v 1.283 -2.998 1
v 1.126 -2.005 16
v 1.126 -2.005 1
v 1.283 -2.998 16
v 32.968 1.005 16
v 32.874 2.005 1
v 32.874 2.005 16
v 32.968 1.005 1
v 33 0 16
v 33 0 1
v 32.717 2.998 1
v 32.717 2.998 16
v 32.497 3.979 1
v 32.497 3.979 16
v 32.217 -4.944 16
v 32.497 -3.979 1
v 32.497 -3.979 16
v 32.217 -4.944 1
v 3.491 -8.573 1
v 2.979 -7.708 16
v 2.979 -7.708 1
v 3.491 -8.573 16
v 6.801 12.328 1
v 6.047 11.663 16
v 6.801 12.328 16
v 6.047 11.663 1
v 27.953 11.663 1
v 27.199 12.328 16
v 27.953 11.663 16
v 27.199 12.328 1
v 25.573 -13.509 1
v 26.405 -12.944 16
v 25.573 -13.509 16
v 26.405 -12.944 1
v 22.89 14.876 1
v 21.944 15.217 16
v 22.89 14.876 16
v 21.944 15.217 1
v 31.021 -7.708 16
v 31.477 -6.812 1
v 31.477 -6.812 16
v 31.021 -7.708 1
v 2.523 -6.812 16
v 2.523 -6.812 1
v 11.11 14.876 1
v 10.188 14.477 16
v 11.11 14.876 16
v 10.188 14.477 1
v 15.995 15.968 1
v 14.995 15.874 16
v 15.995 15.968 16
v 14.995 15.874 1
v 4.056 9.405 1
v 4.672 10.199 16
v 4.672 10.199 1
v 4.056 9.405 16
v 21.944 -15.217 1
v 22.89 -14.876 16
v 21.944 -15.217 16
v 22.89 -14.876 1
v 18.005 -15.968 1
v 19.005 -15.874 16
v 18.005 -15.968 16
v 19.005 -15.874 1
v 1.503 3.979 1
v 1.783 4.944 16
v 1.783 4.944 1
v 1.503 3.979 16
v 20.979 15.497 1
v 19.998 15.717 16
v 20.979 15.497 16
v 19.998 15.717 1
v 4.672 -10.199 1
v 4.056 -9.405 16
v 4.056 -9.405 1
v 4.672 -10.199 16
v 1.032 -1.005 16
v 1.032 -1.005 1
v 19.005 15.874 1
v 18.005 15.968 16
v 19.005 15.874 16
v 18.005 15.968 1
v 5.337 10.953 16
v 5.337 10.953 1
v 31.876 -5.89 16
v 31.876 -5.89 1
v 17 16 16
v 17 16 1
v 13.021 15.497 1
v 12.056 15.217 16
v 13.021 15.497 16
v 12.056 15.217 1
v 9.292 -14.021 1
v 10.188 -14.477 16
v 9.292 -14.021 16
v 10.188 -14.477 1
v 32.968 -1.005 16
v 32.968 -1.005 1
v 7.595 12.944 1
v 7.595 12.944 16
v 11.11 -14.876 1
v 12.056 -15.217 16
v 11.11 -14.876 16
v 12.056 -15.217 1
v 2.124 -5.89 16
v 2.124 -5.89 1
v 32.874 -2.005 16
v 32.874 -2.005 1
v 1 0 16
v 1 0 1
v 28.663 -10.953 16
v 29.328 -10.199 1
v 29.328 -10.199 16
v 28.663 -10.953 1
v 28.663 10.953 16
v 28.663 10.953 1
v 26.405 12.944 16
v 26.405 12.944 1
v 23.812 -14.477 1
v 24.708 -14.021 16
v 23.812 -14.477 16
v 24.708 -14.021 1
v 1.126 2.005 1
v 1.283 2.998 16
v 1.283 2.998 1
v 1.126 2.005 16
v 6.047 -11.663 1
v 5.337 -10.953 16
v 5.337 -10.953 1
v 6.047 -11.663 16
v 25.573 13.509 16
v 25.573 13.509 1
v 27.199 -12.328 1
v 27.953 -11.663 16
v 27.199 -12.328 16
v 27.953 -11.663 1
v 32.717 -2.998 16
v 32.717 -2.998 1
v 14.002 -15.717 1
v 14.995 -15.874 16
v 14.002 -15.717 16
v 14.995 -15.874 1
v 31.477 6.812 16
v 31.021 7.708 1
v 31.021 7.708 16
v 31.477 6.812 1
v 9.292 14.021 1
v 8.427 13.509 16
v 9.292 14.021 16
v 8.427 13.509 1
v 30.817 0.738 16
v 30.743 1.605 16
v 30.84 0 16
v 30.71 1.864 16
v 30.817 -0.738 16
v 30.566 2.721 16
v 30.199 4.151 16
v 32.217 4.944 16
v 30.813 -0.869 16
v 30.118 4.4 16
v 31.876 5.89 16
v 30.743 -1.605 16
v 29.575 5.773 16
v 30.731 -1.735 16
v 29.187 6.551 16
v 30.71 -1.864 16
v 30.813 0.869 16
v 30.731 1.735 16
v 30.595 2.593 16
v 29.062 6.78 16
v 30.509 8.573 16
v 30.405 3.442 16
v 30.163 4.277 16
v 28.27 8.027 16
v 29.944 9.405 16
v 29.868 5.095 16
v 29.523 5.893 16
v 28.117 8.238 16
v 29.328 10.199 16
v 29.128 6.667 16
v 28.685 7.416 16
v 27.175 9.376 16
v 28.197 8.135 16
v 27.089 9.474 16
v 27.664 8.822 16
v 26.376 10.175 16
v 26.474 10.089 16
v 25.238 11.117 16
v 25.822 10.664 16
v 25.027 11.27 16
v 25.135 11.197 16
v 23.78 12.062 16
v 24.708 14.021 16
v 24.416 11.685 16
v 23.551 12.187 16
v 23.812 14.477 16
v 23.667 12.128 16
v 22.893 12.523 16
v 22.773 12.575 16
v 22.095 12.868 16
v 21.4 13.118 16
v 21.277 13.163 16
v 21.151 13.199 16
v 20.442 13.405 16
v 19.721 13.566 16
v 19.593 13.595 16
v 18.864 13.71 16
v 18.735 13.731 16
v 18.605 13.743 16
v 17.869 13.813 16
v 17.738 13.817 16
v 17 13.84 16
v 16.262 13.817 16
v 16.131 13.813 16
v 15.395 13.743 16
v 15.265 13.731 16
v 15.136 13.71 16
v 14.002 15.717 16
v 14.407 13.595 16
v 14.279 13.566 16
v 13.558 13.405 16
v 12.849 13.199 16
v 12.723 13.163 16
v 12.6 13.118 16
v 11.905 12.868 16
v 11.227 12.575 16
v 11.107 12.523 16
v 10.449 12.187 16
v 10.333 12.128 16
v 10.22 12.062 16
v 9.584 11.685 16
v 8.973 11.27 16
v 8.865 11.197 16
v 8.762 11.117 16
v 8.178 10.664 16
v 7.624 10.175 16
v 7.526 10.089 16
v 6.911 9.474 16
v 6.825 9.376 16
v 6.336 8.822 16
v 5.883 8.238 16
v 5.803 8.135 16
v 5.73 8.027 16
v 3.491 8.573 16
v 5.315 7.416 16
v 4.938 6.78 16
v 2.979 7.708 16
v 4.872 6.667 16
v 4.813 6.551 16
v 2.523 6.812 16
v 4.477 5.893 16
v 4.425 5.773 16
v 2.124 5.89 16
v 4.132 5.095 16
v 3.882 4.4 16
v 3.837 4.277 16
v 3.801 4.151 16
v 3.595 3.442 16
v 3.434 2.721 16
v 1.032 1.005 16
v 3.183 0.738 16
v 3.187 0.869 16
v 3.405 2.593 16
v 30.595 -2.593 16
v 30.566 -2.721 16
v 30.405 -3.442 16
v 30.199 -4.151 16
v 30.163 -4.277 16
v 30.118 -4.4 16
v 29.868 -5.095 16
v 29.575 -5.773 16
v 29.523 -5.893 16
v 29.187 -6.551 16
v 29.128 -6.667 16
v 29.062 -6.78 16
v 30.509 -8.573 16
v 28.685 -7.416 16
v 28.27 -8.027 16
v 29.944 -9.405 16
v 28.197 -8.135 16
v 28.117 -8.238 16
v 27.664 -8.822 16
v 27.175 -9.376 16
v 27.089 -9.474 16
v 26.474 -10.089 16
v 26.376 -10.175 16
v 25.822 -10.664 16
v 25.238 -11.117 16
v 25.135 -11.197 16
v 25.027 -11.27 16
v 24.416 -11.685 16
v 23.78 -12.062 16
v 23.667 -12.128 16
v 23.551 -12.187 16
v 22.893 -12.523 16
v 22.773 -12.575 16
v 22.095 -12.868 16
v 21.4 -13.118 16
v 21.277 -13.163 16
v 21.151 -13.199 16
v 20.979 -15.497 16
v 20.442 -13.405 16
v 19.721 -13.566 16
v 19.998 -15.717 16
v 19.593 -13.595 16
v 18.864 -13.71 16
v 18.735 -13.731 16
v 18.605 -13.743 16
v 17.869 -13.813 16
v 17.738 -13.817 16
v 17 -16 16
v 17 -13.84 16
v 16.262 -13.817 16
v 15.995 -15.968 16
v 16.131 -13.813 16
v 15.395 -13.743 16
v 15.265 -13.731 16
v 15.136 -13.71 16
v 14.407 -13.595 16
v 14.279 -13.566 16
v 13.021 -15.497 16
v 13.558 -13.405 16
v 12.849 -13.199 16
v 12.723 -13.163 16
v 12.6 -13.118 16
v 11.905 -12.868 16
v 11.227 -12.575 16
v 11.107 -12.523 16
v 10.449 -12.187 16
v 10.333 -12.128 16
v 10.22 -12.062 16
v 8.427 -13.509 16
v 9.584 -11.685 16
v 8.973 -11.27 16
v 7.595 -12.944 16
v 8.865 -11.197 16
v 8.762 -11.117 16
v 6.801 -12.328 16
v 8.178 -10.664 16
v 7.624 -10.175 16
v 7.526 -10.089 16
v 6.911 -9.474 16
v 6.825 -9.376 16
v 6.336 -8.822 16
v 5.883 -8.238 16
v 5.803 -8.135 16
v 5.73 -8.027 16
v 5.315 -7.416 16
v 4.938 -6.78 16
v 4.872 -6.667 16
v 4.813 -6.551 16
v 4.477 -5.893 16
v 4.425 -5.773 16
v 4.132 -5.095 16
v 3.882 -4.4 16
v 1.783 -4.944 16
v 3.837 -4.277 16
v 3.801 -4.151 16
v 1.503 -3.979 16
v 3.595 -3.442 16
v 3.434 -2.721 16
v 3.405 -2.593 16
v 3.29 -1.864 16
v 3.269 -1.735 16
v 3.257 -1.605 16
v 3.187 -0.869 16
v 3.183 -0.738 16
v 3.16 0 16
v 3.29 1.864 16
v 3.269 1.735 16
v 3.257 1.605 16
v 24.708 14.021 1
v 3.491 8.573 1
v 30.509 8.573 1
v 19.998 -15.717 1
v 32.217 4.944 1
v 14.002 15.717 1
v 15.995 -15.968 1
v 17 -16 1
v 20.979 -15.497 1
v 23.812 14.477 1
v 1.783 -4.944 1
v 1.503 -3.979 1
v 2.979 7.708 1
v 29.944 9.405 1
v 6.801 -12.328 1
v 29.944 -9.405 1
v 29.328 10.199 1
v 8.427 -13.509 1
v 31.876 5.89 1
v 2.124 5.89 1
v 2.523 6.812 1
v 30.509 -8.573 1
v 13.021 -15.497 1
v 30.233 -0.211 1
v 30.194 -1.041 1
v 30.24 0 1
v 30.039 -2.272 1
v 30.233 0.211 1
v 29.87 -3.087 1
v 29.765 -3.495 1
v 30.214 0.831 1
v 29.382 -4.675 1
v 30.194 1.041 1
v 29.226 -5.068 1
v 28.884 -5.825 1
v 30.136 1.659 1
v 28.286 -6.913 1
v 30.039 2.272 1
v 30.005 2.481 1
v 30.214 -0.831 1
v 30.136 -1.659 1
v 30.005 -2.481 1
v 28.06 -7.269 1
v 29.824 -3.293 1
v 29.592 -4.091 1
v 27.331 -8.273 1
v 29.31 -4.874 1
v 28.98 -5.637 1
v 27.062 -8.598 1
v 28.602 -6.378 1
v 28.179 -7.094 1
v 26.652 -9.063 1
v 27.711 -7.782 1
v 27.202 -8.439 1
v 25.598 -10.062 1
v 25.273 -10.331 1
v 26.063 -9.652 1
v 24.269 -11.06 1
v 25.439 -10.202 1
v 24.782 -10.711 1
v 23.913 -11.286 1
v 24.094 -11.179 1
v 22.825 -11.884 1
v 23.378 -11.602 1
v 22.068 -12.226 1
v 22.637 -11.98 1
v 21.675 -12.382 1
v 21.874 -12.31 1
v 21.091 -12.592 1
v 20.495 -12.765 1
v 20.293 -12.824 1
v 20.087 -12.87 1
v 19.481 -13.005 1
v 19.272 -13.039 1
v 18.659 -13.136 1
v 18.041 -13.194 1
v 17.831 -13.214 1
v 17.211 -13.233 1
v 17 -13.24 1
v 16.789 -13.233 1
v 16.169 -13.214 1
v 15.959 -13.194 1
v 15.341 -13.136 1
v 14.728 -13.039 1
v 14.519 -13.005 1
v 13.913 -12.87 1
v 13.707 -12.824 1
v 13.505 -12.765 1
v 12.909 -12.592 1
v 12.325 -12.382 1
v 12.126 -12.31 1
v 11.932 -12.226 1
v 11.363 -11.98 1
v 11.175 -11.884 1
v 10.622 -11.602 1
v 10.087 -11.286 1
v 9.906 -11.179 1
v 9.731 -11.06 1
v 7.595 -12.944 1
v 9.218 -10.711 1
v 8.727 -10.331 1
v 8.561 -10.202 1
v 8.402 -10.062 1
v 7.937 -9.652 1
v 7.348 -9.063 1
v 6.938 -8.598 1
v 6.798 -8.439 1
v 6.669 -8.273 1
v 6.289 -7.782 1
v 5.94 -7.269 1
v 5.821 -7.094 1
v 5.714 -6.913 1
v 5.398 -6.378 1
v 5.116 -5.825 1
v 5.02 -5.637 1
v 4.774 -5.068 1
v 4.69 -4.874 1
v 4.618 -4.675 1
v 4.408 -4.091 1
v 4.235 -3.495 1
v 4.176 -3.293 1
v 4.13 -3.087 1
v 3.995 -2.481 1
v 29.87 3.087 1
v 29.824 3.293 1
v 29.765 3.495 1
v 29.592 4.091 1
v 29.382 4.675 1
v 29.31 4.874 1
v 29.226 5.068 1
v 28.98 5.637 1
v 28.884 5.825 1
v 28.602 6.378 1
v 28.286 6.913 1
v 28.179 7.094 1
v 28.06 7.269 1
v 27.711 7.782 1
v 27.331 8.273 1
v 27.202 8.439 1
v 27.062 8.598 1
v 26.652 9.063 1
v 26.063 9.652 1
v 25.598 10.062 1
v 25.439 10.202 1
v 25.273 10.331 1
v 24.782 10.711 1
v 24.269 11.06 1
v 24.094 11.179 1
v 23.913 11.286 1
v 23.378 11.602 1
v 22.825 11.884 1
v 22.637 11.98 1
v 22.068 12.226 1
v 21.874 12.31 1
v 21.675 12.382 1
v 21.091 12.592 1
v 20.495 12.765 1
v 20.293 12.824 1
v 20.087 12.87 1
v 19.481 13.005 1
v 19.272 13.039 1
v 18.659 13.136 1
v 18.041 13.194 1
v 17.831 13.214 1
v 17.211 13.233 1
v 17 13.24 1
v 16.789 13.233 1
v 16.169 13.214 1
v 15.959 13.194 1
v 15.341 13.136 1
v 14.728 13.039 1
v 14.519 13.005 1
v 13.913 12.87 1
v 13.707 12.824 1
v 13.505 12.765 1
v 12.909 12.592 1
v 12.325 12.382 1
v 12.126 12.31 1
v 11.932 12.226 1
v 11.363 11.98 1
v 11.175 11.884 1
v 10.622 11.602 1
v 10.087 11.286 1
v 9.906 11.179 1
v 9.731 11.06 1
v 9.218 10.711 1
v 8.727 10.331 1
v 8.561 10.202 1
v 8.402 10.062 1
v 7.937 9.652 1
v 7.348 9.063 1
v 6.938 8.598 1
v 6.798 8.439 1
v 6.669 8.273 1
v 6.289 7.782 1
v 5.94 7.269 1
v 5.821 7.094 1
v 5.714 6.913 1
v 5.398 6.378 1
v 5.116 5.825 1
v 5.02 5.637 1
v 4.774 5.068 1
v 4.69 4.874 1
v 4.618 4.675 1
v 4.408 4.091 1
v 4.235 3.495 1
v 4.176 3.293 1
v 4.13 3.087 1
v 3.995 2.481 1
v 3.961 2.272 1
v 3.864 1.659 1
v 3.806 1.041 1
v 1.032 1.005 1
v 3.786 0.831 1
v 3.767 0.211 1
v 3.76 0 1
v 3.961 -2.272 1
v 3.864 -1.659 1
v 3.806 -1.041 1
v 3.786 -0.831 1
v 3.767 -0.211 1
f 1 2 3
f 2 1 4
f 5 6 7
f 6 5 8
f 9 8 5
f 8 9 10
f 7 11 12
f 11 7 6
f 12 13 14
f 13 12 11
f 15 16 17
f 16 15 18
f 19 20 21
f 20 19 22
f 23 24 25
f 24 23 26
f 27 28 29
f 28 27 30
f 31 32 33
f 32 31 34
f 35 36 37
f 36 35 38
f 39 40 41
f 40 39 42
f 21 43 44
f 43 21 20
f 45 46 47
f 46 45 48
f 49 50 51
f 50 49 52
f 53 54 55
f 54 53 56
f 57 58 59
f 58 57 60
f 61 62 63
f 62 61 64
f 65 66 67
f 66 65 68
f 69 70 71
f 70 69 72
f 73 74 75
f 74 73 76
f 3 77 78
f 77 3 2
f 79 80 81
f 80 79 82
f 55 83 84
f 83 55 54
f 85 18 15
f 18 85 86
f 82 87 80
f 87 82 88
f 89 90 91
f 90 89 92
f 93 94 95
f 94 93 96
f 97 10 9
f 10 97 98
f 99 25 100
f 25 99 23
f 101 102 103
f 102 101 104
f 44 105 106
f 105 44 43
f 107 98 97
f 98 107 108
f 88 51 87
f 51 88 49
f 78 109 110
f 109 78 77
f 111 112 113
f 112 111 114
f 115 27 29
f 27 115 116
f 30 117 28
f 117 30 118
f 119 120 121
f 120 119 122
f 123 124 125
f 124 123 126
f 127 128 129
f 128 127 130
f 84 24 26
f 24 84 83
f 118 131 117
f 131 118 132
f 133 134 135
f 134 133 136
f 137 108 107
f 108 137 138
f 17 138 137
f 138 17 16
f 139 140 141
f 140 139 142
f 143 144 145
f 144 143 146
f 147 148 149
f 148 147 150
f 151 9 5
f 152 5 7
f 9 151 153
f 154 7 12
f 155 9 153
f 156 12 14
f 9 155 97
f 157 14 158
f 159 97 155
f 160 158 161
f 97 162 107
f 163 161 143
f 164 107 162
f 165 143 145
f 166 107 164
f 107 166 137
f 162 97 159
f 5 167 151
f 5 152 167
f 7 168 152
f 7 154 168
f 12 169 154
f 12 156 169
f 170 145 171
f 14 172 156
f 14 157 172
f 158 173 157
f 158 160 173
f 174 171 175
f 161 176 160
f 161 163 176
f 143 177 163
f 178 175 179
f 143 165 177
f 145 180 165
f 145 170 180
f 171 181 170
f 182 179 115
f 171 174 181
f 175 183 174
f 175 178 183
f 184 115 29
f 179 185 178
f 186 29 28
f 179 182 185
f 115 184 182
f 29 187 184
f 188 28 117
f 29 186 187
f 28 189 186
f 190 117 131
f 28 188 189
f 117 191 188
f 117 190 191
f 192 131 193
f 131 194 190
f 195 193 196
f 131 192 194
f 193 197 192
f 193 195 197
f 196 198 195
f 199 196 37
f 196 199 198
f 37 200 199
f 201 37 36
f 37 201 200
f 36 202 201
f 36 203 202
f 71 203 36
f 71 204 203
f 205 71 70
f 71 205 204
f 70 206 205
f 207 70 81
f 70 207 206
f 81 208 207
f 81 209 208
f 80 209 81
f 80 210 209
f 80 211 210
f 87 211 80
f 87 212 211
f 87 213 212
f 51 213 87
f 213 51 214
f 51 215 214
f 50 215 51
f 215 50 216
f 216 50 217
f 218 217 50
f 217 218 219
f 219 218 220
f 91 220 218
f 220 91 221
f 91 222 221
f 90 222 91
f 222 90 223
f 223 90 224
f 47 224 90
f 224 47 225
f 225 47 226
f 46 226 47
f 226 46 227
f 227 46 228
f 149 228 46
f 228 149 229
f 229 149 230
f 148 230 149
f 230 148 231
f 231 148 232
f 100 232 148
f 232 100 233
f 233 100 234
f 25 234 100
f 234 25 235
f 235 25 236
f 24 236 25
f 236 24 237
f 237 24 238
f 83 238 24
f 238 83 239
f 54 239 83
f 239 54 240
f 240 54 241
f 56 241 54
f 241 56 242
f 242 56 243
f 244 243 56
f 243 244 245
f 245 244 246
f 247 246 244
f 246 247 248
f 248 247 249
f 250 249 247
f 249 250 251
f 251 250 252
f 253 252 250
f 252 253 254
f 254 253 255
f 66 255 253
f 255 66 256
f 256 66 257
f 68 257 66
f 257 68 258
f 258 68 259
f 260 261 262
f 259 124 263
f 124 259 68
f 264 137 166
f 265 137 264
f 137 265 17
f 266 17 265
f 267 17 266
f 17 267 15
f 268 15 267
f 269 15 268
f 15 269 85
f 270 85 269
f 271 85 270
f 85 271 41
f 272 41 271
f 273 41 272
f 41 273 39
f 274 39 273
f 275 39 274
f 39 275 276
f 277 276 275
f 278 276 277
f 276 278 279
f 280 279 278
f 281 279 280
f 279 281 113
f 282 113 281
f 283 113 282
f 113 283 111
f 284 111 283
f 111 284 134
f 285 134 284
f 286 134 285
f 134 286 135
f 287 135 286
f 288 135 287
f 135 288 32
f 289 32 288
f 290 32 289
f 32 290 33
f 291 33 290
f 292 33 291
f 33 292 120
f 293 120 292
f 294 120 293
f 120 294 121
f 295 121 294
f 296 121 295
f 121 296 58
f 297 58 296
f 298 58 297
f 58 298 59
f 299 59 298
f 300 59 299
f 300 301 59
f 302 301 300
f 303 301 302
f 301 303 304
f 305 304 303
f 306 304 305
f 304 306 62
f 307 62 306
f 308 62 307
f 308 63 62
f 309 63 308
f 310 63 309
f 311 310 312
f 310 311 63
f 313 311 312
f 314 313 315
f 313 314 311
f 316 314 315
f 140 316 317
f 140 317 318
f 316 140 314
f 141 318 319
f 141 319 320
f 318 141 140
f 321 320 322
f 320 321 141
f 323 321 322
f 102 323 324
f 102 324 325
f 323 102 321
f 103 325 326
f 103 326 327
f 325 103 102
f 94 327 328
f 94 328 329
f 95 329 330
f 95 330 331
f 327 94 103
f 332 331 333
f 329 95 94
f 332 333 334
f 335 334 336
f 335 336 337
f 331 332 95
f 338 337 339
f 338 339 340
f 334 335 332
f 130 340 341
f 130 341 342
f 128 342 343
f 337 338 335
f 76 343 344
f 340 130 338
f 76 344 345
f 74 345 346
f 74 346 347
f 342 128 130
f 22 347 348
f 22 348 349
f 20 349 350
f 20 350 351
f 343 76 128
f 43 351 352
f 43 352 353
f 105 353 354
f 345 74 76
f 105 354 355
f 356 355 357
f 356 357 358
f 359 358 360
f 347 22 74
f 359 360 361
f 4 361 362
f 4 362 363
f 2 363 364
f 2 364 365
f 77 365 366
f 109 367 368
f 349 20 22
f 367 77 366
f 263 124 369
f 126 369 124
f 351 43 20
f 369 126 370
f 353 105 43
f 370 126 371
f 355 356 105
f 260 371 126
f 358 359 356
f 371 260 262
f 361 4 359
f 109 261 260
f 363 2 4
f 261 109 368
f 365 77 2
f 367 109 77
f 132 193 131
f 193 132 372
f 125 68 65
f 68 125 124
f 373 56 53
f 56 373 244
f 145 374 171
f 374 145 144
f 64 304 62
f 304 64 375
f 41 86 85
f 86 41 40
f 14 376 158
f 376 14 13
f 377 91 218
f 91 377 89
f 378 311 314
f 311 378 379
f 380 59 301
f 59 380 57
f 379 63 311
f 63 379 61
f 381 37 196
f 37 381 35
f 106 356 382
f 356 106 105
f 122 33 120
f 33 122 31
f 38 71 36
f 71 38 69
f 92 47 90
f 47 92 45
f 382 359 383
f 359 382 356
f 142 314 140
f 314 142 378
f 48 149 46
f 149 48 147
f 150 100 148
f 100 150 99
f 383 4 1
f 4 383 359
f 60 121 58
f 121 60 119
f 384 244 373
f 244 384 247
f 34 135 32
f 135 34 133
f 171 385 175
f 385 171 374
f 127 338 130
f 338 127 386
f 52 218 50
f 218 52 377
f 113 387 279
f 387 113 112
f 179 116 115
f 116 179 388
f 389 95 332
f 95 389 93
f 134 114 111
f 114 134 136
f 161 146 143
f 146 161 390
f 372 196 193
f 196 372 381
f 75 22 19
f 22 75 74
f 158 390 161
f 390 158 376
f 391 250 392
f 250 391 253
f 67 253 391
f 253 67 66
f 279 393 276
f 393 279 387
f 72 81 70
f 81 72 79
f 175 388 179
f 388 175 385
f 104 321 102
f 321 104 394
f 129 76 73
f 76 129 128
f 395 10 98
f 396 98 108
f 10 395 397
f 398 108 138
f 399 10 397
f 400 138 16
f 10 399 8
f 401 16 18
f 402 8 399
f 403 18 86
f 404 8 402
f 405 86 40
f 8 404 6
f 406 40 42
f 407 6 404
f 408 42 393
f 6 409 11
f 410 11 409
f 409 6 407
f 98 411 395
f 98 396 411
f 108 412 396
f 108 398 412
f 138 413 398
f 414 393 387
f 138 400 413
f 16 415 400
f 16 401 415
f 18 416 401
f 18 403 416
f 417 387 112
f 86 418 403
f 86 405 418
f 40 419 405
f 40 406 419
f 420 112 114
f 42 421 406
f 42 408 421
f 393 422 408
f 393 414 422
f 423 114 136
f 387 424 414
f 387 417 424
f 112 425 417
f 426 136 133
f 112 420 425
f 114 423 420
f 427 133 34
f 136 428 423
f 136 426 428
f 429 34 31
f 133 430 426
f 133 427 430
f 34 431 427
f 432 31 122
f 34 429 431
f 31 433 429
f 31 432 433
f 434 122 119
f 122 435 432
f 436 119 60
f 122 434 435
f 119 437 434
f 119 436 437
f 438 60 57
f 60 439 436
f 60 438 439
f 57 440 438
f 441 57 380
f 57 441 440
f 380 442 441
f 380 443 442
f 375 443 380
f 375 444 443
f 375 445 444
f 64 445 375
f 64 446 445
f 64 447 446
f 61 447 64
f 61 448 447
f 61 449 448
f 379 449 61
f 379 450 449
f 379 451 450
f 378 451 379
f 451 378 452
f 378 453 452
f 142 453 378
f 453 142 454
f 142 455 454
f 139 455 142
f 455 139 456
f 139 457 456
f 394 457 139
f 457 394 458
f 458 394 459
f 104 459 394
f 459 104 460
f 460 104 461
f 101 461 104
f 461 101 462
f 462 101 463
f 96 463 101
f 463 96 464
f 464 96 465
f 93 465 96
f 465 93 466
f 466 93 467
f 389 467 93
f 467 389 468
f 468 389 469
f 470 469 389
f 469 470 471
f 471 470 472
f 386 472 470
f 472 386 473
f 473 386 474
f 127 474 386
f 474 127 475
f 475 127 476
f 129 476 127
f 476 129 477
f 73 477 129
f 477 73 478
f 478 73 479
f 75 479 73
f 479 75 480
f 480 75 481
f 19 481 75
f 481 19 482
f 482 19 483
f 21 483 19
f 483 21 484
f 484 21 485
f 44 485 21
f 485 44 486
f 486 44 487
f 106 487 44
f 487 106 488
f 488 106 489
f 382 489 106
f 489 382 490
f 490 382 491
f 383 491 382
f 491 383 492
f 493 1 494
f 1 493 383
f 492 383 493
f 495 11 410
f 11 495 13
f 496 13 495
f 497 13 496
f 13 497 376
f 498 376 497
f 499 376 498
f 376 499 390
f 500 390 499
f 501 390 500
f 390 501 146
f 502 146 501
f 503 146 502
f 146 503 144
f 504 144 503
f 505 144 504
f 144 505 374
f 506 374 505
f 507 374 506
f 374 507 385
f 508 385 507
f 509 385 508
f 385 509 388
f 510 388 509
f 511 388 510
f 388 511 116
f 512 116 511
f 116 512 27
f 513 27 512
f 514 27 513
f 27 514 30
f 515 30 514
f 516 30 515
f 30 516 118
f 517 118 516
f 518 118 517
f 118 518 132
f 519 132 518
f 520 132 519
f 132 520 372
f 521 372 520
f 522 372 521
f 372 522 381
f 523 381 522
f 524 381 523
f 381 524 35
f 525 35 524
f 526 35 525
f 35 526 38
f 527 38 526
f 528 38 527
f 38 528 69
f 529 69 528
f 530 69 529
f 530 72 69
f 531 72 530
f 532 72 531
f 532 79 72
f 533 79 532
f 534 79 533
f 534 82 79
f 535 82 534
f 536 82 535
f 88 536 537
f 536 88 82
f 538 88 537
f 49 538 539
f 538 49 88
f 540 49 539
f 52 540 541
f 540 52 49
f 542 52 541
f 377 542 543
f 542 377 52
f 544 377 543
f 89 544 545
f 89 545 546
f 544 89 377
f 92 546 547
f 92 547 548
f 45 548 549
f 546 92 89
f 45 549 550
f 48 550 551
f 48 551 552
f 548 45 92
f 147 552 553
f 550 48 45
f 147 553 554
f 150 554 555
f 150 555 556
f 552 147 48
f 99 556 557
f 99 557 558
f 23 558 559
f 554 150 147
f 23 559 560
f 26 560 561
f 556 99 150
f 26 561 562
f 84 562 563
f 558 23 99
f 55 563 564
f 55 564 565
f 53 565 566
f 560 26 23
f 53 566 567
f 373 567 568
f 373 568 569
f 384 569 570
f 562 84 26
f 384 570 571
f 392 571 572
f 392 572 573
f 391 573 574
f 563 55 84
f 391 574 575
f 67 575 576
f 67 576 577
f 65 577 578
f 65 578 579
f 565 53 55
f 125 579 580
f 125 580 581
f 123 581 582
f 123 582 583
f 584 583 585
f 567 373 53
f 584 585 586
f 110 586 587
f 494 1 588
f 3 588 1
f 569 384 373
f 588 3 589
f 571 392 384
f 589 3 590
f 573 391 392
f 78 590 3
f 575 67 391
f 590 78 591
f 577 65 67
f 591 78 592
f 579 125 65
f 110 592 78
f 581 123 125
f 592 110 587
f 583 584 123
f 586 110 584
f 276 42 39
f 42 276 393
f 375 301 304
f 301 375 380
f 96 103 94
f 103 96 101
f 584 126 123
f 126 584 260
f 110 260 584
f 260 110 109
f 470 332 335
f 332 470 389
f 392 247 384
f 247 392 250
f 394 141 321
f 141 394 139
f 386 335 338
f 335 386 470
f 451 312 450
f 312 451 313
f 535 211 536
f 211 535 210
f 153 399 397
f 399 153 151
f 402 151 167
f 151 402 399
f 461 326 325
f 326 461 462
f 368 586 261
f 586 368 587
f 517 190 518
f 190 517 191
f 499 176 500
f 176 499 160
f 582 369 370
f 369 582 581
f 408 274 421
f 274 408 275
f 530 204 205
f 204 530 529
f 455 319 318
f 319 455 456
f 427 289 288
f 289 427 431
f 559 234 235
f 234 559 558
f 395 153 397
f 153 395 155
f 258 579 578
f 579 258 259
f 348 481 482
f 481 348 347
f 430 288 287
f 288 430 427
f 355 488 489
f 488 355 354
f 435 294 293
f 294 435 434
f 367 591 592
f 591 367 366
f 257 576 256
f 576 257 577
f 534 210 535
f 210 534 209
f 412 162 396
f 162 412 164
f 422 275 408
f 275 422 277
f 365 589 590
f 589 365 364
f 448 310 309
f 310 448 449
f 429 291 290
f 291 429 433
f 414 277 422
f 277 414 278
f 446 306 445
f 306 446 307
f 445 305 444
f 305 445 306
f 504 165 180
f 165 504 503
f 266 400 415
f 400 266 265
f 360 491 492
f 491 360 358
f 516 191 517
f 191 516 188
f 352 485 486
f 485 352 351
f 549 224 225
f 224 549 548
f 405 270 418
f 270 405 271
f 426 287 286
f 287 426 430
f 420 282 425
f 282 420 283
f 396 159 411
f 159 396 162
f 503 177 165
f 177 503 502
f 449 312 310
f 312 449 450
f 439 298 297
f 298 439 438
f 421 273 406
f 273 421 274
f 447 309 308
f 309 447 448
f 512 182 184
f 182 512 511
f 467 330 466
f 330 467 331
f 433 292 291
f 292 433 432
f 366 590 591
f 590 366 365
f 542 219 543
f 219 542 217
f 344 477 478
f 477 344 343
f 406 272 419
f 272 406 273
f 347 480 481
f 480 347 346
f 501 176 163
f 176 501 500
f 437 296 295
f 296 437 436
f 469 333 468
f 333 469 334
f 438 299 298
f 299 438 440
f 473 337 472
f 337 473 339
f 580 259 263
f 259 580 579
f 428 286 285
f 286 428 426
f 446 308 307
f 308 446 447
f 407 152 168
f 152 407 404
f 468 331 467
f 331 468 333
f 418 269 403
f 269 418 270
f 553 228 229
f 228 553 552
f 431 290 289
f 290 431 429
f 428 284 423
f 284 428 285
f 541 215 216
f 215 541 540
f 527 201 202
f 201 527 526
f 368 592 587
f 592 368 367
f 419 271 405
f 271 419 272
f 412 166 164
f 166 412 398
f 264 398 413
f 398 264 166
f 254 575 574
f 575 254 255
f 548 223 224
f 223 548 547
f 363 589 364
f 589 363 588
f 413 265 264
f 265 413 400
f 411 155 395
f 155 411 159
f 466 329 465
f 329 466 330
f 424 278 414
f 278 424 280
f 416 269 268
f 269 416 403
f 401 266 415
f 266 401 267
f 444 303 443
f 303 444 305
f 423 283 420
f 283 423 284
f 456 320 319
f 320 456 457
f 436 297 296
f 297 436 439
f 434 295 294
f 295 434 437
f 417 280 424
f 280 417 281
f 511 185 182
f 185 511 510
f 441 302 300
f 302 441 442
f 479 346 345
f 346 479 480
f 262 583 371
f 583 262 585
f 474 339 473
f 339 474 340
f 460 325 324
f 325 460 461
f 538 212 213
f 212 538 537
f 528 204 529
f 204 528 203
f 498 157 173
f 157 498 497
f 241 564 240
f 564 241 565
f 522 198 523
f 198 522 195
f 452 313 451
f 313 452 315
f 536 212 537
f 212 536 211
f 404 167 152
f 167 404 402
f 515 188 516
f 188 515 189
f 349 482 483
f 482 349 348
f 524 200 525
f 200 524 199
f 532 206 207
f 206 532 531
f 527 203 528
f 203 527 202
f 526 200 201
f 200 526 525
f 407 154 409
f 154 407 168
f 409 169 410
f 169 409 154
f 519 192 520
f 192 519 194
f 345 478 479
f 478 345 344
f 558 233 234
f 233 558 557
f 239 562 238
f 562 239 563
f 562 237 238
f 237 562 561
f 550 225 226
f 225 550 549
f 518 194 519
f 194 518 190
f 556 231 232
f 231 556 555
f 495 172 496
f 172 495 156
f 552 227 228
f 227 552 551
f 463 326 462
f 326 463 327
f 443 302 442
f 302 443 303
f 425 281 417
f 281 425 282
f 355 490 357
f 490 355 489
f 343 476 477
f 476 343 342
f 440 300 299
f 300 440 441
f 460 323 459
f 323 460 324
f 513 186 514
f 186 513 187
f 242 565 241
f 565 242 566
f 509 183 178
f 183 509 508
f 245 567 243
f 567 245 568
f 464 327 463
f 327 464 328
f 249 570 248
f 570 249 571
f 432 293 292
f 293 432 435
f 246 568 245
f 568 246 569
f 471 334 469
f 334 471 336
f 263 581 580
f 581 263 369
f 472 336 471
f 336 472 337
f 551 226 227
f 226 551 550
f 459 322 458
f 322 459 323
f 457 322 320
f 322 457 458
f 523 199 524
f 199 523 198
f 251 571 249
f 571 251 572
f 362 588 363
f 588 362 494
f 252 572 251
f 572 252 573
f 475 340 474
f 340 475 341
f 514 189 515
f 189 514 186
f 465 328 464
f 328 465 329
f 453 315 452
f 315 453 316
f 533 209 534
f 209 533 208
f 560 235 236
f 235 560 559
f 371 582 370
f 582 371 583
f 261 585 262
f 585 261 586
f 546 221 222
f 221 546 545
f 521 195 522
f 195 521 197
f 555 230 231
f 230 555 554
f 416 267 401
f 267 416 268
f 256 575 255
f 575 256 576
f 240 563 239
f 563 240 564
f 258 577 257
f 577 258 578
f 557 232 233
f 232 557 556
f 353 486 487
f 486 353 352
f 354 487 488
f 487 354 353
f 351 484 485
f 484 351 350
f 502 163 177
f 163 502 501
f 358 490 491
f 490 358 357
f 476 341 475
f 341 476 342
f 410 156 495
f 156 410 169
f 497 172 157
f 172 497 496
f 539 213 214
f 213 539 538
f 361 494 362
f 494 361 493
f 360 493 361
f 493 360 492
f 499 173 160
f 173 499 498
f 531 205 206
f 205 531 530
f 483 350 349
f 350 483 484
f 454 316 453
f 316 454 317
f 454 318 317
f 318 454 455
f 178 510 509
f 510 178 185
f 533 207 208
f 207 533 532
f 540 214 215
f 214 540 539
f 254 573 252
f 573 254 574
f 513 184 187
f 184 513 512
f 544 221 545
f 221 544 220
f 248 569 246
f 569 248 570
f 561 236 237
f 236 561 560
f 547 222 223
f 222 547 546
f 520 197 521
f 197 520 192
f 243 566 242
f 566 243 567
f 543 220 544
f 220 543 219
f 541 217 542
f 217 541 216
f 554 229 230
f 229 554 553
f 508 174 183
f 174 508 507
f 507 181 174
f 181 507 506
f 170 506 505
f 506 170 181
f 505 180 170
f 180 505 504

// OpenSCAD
/* Microscope Camera Holder, part of http://www.thingiverse.com/thing:XXXXX
 *
 * Copyright (c) 2012  Henrik Brix Andersen <henrik@brixandersen.dk>
 * License: CC BY-SA
 */

// Rendering
$fn = 100;

module holder(hole_dia, hole_offset, length, width, thickness) {
	difference() {
		union() {
			// Lower plate
			translate([-length / 2, -width / 2, thickness / 2]) {
				scale(v = [0.815, 0.85, 1])
					linear_extrude(height = thickness, center = true, convexity = 10)
						import(file = "holder.dxf", layer = "Outline");
			}

			// Upper plate
			translate([-length / 2 - 0.3, -width / 2 - 0.3, thickness / 2 + 0.5]) {
				scale(v = [0.825, 0.87, 1])
					linear_extrude(height = thickness - 1, center = true, convexity = 10)
						import(file = "holder.dxf", layer = "Outline");
			}

			// Guide for debugging
			*translate([0, -0.3, 0]) {
				%cube([69.1, 28.3, 5], center = true);
			}

			// Pipe
			translate([length / 2 - hole_offset, 0, 1]) {
				cylinder(h = thickness * 3, r = (hole_dia + 6) / 2);
			}
		}

		// Microscope hole
		translate([length / 2 - hole_offset, 0, -thickness]) {
			cylinder(h = thickness * 5, r1 = hole_dia / 2, r2 = hole_dia / 2 + 1);
		}
	}
}

holder(26, 17.5, 69, 29, 5);
